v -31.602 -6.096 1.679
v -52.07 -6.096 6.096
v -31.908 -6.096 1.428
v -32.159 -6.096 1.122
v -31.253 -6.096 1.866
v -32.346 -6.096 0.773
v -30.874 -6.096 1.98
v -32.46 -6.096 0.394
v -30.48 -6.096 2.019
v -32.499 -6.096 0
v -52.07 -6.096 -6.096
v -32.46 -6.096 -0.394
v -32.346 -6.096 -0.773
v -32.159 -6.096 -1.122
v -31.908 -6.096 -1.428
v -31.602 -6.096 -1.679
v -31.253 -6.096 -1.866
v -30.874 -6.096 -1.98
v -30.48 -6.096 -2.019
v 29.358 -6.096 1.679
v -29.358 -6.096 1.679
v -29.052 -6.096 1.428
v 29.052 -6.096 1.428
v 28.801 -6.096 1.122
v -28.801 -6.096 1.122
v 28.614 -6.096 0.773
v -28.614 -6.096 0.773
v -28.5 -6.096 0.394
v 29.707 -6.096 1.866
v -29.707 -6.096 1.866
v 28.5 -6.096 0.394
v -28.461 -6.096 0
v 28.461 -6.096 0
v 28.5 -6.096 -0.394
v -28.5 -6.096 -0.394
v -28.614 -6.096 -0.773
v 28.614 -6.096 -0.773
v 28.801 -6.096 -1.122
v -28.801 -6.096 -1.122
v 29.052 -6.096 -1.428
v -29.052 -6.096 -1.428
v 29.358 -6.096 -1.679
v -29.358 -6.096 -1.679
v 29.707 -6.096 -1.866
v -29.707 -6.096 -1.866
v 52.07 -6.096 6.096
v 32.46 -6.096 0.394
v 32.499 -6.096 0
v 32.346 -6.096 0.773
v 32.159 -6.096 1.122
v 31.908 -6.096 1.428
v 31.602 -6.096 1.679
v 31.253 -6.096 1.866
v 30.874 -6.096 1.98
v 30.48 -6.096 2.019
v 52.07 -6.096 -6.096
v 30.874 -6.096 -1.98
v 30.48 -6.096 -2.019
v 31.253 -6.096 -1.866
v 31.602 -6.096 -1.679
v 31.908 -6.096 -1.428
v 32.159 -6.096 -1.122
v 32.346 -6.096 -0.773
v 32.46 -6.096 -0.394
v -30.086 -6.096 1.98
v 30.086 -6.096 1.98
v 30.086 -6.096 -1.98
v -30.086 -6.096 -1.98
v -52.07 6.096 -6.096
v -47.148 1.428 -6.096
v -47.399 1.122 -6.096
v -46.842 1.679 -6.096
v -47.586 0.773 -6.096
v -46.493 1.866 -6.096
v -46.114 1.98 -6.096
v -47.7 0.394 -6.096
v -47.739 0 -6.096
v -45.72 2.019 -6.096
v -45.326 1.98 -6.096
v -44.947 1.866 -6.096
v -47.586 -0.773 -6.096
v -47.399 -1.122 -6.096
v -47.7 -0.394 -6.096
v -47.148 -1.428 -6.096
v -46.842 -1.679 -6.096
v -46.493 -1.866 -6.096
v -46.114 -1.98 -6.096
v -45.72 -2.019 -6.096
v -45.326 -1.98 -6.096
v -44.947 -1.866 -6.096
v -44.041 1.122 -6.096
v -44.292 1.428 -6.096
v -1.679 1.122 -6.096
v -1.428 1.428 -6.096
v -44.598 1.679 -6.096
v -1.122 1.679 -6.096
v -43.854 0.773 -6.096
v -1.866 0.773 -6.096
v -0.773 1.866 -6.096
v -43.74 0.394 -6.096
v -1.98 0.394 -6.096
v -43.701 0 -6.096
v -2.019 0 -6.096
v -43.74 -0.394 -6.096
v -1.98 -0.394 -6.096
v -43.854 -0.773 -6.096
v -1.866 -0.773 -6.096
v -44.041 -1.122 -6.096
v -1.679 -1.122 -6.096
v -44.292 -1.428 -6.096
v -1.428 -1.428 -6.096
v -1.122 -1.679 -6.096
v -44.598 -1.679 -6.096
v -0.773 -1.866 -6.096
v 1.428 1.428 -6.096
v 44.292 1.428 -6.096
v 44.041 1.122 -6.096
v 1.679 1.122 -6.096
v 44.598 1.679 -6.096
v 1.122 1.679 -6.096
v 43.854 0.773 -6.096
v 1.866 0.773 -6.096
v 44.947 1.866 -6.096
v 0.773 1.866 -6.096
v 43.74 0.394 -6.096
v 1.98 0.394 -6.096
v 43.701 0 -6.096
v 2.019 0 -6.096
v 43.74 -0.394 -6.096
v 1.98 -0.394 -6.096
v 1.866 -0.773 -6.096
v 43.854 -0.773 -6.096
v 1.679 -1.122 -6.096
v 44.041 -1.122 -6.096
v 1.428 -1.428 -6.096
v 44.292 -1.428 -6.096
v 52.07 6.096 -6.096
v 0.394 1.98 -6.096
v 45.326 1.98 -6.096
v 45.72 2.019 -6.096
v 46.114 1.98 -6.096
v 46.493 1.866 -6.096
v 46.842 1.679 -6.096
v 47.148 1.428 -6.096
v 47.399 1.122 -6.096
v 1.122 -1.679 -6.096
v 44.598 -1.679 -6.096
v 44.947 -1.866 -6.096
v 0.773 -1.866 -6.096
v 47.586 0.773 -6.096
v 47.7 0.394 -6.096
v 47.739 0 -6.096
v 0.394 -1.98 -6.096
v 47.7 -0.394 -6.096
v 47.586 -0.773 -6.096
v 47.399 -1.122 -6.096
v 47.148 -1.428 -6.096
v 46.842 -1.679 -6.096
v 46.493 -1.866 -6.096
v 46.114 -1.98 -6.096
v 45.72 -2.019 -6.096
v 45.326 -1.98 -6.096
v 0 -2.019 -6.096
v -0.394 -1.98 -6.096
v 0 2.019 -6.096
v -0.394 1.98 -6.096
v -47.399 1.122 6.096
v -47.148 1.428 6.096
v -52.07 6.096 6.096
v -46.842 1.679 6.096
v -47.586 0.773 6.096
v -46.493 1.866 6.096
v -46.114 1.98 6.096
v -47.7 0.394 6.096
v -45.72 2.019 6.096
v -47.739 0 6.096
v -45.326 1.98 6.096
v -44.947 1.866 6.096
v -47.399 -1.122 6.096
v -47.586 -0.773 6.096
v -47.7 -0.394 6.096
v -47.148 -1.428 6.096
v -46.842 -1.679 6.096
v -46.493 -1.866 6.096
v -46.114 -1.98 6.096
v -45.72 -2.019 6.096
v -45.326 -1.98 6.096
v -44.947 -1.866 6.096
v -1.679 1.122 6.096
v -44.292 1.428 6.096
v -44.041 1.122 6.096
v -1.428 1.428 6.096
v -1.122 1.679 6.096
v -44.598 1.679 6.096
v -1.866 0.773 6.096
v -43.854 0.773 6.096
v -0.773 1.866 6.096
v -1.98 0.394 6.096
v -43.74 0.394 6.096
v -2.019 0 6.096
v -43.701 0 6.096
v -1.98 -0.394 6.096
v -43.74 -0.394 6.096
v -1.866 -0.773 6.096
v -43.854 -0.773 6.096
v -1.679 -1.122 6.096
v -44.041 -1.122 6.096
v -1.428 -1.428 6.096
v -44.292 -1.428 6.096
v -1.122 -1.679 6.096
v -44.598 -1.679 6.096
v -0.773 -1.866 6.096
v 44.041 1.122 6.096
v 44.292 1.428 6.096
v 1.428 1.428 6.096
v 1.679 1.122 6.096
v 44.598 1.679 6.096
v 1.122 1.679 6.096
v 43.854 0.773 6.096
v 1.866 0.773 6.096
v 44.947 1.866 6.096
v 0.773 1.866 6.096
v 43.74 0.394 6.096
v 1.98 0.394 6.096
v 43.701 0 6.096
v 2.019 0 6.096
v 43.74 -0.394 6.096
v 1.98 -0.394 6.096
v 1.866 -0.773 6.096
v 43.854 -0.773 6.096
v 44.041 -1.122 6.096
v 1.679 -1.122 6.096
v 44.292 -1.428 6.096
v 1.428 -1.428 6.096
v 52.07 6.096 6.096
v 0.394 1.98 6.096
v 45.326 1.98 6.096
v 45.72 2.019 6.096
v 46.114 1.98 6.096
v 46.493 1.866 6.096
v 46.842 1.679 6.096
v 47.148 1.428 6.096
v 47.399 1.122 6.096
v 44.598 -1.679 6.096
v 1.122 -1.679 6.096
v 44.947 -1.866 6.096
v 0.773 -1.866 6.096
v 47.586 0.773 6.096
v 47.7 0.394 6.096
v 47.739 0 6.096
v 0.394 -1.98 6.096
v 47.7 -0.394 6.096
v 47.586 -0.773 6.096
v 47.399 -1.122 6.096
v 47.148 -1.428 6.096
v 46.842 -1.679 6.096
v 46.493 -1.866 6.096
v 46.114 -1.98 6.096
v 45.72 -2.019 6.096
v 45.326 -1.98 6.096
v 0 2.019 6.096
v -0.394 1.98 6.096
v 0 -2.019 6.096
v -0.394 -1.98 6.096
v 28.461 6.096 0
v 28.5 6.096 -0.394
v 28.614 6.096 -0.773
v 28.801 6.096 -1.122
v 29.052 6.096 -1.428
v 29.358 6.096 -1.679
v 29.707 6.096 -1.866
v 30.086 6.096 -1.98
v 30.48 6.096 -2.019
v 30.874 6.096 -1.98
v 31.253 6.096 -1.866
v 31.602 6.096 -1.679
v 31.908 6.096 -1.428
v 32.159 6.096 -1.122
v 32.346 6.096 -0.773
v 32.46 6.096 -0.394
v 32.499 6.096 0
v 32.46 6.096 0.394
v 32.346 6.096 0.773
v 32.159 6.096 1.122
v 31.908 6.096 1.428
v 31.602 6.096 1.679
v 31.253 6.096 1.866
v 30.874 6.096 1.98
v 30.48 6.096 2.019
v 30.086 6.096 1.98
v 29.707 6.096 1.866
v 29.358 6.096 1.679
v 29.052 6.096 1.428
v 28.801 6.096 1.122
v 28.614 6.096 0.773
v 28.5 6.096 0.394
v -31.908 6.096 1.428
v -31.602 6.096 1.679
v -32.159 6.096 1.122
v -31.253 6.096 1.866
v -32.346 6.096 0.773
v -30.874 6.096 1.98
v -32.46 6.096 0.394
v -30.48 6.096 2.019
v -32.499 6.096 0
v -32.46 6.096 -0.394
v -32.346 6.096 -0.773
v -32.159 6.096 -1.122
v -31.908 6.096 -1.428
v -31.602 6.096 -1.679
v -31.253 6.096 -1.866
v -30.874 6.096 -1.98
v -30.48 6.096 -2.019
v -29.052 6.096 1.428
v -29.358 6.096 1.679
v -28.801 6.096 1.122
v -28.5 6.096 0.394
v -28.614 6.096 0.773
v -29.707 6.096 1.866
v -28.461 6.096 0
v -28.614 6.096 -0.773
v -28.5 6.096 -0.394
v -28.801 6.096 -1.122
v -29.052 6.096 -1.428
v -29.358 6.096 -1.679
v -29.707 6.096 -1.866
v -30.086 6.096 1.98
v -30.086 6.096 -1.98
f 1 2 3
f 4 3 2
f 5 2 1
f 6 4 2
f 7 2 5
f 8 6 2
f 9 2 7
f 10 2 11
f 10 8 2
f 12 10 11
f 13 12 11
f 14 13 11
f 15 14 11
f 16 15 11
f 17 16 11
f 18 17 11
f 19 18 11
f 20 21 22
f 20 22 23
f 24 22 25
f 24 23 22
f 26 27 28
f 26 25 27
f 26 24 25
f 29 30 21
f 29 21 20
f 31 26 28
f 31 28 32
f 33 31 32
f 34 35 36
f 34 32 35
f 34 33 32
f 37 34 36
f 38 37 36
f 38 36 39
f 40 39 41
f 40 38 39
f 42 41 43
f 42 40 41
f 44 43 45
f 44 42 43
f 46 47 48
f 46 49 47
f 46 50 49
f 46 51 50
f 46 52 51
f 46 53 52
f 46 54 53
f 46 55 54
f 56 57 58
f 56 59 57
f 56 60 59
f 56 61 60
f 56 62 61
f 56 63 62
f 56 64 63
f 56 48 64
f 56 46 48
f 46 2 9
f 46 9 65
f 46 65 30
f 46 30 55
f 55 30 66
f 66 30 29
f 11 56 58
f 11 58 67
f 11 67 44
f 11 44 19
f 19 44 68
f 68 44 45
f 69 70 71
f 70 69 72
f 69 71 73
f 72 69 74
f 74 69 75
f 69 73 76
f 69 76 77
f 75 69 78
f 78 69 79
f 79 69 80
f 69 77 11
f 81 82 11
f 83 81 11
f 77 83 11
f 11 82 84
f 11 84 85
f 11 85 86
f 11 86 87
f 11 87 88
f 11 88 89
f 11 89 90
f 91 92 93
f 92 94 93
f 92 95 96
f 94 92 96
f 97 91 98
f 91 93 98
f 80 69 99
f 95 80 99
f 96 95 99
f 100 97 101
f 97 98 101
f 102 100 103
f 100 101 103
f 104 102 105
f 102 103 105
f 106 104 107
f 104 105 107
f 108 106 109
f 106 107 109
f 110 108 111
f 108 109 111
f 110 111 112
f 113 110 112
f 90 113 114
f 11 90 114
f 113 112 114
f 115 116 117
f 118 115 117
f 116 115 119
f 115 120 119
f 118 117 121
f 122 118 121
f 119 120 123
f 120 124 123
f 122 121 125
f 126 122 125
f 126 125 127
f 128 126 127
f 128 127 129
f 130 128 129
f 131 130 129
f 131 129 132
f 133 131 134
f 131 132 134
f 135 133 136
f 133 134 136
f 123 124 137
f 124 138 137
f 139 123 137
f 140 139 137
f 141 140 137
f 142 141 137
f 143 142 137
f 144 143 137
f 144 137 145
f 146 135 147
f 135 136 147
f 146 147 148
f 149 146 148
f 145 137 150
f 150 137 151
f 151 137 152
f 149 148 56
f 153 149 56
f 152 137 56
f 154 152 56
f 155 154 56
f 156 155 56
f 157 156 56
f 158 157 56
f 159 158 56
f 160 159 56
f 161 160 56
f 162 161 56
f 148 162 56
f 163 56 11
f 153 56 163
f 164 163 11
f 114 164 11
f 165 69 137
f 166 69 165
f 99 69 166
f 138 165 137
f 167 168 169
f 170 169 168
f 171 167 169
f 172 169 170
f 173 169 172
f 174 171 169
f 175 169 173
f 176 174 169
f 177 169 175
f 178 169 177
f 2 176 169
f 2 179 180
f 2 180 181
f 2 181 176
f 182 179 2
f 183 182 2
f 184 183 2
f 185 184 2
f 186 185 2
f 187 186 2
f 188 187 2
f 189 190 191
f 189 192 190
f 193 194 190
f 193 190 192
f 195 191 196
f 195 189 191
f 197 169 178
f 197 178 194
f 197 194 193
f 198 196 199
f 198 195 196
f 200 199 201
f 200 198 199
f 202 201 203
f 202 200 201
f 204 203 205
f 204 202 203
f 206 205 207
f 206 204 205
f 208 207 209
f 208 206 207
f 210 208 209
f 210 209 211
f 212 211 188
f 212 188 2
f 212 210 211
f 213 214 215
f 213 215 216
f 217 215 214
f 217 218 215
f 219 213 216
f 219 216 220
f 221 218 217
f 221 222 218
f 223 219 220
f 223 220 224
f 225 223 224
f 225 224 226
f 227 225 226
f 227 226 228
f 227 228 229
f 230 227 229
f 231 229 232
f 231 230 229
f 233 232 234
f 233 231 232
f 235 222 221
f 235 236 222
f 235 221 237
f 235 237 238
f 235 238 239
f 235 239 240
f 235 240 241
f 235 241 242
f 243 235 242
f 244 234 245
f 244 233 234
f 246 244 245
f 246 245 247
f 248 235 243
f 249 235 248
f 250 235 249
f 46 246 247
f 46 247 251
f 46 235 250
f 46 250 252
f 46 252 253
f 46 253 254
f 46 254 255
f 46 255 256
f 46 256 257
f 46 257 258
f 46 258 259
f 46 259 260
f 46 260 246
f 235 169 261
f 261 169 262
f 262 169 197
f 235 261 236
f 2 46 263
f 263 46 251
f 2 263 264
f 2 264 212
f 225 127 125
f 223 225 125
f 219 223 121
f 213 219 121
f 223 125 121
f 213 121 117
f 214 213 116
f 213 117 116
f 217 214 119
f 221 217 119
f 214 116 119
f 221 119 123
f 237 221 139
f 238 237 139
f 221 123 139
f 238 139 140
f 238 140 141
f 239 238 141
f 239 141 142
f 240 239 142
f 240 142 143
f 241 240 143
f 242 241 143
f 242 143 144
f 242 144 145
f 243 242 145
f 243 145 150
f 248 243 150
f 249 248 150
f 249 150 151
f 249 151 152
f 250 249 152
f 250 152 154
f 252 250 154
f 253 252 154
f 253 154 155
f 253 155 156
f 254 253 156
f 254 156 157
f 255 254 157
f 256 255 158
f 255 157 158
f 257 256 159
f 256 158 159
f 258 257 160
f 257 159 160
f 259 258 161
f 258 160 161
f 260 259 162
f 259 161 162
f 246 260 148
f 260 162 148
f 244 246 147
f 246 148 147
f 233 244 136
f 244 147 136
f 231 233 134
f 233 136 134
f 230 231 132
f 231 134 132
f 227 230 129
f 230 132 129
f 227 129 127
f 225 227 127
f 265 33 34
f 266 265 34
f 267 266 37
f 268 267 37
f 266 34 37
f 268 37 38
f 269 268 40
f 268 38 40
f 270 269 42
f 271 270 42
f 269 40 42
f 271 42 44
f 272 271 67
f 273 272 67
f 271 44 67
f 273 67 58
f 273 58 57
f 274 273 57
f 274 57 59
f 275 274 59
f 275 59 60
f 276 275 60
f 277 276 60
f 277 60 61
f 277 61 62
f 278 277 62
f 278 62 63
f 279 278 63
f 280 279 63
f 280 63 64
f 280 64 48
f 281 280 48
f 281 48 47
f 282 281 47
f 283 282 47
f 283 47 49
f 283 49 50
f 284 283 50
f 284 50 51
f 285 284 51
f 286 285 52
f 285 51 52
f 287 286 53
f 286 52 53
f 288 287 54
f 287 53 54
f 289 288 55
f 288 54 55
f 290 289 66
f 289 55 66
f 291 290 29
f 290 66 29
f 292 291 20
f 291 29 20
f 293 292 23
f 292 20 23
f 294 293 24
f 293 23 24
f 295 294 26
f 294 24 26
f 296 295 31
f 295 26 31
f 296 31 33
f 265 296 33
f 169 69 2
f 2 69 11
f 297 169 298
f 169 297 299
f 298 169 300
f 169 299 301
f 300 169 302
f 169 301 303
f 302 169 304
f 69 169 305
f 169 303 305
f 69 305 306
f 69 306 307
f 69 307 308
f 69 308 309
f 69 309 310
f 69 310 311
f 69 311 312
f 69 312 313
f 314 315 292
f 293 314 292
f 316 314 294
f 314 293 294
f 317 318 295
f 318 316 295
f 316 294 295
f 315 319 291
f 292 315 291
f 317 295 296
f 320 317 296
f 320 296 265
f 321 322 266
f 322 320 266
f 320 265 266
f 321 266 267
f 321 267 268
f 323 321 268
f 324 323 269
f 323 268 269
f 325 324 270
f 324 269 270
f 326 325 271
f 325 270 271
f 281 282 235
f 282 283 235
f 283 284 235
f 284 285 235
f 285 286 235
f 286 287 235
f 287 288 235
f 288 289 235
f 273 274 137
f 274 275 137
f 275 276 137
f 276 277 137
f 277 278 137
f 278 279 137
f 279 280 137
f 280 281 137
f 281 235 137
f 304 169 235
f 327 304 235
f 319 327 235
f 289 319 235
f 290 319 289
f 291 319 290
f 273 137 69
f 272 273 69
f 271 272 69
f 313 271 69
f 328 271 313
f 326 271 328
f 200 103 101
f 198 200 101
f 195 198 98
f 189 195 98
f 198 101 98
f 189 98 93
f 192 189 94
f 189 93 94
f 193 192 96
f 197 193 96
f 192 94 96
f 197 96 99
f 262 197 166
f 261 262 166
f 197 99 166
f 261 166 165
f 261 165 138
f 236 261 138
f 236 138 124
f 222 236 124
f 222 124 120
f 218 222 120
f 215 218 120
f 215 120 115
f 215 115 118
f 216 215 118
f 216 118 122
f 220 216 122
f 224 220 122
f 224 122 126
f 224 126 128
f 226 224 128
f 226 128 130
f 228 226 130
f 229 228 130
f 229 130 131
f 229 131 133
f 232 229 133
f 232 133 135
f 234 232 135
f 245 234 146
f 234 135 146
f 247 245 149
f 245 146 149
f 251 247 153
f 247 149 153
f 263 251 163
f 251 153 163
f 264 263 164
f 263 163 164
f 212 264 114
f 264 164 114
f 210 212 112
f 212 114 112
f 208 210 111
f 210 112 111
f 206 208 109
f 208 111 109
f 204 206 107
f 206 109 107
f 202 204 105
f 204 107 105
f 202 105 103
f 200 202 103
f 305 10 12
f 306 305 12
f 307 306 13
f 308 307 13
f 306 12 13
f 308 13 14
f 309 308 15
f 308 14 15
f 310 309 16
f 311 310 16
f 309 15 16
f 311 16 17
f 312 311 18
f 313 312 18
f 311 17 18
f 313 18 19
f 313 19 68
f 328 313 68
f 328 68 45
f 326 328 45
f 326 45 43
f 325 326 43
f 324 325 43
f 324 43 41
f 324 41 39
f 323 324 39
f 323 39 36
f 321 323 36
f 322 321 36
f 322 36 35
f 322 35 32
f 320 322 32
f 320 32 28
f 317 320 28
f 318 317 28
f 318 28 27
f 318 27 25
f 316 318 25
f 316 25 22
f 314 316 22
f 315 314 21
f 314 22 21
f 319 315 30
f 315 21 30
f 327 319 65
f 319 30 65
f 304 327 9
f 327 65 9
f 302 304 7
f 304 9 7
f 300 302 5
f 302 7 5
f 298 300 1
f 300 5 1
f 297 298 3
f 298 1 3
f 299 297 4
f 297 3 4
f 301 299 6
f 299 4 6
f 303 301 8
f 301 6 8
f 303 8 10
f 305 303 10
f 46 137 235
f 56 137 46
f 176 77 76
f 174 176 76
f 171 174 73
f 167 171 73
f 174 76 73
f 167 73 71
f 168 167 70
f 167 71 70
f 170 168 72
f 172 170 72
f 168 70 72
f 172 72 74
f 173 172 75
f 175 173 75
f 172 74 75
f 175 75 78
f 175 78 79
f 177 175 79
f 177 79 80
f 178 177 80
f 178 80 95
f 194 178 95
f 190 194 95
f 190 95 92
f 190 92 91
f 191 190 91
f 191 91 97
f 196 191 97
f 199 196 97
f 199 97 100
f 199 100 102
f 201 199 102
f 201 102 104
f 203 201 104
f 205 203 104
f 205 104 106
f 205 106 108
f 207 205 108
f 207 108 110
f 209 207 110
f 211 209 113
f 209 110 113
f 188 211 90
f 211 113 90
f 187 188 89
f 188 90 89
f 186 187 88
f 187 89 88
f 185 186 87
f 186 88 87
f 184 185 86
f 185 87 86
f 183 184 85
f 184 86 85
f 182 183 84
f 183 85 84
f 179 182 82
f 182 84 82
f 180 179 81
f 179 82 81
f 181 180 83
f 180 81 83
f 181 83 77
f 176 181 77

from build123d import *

# Parameters (mm, degrees)
SKETCH1_W                  = 12.192
SKETCH1_H                  = 12.192
BOSS_EXTRUDE1_DEPTH        = 52.07
TAP_DRILL_FOR_10_32_TAP1_D = 4.0386
TAP_DRILL_FOR_10_32_TAP2_D = 4.0386


with BuildPart() as part:
    # Sketch1 → Boss-Extrude1 (new, symmetric)
    with BuildSketch(Plane(origin=(0, 0, 0), x_dir=(0, -1, 0), z_dir=(1, 0, 0))):
        Rectangle(SKETCH1_W, SKETCH1_H)
    extrude(amount=BOSS_EXTRUDE1_DEPTH, both=True)

    # Tap Drill for #10-32 Tap1 (through all)
    with Locations(Plane.XY.offset(6.096)):
        with Locations((-45.72, 0), (45.72, 0), (0, 0)):
            Hole(TAP_DRILL_FOR_10_32_TAP1_D / 2)

    # Tap Drill for #10-32 Tap2 (through all)
    with Locations(Plane(origin=(0, 6.096, 0), x_dir=(1, 0, 0), z_dir=(0, 1, 0))):
        with Locations((-30.48, 0), (30.48, 0)):
            Hole(TAP_DRILL_FOR_10_32_TAP2_D / 2)


solid = part.part
